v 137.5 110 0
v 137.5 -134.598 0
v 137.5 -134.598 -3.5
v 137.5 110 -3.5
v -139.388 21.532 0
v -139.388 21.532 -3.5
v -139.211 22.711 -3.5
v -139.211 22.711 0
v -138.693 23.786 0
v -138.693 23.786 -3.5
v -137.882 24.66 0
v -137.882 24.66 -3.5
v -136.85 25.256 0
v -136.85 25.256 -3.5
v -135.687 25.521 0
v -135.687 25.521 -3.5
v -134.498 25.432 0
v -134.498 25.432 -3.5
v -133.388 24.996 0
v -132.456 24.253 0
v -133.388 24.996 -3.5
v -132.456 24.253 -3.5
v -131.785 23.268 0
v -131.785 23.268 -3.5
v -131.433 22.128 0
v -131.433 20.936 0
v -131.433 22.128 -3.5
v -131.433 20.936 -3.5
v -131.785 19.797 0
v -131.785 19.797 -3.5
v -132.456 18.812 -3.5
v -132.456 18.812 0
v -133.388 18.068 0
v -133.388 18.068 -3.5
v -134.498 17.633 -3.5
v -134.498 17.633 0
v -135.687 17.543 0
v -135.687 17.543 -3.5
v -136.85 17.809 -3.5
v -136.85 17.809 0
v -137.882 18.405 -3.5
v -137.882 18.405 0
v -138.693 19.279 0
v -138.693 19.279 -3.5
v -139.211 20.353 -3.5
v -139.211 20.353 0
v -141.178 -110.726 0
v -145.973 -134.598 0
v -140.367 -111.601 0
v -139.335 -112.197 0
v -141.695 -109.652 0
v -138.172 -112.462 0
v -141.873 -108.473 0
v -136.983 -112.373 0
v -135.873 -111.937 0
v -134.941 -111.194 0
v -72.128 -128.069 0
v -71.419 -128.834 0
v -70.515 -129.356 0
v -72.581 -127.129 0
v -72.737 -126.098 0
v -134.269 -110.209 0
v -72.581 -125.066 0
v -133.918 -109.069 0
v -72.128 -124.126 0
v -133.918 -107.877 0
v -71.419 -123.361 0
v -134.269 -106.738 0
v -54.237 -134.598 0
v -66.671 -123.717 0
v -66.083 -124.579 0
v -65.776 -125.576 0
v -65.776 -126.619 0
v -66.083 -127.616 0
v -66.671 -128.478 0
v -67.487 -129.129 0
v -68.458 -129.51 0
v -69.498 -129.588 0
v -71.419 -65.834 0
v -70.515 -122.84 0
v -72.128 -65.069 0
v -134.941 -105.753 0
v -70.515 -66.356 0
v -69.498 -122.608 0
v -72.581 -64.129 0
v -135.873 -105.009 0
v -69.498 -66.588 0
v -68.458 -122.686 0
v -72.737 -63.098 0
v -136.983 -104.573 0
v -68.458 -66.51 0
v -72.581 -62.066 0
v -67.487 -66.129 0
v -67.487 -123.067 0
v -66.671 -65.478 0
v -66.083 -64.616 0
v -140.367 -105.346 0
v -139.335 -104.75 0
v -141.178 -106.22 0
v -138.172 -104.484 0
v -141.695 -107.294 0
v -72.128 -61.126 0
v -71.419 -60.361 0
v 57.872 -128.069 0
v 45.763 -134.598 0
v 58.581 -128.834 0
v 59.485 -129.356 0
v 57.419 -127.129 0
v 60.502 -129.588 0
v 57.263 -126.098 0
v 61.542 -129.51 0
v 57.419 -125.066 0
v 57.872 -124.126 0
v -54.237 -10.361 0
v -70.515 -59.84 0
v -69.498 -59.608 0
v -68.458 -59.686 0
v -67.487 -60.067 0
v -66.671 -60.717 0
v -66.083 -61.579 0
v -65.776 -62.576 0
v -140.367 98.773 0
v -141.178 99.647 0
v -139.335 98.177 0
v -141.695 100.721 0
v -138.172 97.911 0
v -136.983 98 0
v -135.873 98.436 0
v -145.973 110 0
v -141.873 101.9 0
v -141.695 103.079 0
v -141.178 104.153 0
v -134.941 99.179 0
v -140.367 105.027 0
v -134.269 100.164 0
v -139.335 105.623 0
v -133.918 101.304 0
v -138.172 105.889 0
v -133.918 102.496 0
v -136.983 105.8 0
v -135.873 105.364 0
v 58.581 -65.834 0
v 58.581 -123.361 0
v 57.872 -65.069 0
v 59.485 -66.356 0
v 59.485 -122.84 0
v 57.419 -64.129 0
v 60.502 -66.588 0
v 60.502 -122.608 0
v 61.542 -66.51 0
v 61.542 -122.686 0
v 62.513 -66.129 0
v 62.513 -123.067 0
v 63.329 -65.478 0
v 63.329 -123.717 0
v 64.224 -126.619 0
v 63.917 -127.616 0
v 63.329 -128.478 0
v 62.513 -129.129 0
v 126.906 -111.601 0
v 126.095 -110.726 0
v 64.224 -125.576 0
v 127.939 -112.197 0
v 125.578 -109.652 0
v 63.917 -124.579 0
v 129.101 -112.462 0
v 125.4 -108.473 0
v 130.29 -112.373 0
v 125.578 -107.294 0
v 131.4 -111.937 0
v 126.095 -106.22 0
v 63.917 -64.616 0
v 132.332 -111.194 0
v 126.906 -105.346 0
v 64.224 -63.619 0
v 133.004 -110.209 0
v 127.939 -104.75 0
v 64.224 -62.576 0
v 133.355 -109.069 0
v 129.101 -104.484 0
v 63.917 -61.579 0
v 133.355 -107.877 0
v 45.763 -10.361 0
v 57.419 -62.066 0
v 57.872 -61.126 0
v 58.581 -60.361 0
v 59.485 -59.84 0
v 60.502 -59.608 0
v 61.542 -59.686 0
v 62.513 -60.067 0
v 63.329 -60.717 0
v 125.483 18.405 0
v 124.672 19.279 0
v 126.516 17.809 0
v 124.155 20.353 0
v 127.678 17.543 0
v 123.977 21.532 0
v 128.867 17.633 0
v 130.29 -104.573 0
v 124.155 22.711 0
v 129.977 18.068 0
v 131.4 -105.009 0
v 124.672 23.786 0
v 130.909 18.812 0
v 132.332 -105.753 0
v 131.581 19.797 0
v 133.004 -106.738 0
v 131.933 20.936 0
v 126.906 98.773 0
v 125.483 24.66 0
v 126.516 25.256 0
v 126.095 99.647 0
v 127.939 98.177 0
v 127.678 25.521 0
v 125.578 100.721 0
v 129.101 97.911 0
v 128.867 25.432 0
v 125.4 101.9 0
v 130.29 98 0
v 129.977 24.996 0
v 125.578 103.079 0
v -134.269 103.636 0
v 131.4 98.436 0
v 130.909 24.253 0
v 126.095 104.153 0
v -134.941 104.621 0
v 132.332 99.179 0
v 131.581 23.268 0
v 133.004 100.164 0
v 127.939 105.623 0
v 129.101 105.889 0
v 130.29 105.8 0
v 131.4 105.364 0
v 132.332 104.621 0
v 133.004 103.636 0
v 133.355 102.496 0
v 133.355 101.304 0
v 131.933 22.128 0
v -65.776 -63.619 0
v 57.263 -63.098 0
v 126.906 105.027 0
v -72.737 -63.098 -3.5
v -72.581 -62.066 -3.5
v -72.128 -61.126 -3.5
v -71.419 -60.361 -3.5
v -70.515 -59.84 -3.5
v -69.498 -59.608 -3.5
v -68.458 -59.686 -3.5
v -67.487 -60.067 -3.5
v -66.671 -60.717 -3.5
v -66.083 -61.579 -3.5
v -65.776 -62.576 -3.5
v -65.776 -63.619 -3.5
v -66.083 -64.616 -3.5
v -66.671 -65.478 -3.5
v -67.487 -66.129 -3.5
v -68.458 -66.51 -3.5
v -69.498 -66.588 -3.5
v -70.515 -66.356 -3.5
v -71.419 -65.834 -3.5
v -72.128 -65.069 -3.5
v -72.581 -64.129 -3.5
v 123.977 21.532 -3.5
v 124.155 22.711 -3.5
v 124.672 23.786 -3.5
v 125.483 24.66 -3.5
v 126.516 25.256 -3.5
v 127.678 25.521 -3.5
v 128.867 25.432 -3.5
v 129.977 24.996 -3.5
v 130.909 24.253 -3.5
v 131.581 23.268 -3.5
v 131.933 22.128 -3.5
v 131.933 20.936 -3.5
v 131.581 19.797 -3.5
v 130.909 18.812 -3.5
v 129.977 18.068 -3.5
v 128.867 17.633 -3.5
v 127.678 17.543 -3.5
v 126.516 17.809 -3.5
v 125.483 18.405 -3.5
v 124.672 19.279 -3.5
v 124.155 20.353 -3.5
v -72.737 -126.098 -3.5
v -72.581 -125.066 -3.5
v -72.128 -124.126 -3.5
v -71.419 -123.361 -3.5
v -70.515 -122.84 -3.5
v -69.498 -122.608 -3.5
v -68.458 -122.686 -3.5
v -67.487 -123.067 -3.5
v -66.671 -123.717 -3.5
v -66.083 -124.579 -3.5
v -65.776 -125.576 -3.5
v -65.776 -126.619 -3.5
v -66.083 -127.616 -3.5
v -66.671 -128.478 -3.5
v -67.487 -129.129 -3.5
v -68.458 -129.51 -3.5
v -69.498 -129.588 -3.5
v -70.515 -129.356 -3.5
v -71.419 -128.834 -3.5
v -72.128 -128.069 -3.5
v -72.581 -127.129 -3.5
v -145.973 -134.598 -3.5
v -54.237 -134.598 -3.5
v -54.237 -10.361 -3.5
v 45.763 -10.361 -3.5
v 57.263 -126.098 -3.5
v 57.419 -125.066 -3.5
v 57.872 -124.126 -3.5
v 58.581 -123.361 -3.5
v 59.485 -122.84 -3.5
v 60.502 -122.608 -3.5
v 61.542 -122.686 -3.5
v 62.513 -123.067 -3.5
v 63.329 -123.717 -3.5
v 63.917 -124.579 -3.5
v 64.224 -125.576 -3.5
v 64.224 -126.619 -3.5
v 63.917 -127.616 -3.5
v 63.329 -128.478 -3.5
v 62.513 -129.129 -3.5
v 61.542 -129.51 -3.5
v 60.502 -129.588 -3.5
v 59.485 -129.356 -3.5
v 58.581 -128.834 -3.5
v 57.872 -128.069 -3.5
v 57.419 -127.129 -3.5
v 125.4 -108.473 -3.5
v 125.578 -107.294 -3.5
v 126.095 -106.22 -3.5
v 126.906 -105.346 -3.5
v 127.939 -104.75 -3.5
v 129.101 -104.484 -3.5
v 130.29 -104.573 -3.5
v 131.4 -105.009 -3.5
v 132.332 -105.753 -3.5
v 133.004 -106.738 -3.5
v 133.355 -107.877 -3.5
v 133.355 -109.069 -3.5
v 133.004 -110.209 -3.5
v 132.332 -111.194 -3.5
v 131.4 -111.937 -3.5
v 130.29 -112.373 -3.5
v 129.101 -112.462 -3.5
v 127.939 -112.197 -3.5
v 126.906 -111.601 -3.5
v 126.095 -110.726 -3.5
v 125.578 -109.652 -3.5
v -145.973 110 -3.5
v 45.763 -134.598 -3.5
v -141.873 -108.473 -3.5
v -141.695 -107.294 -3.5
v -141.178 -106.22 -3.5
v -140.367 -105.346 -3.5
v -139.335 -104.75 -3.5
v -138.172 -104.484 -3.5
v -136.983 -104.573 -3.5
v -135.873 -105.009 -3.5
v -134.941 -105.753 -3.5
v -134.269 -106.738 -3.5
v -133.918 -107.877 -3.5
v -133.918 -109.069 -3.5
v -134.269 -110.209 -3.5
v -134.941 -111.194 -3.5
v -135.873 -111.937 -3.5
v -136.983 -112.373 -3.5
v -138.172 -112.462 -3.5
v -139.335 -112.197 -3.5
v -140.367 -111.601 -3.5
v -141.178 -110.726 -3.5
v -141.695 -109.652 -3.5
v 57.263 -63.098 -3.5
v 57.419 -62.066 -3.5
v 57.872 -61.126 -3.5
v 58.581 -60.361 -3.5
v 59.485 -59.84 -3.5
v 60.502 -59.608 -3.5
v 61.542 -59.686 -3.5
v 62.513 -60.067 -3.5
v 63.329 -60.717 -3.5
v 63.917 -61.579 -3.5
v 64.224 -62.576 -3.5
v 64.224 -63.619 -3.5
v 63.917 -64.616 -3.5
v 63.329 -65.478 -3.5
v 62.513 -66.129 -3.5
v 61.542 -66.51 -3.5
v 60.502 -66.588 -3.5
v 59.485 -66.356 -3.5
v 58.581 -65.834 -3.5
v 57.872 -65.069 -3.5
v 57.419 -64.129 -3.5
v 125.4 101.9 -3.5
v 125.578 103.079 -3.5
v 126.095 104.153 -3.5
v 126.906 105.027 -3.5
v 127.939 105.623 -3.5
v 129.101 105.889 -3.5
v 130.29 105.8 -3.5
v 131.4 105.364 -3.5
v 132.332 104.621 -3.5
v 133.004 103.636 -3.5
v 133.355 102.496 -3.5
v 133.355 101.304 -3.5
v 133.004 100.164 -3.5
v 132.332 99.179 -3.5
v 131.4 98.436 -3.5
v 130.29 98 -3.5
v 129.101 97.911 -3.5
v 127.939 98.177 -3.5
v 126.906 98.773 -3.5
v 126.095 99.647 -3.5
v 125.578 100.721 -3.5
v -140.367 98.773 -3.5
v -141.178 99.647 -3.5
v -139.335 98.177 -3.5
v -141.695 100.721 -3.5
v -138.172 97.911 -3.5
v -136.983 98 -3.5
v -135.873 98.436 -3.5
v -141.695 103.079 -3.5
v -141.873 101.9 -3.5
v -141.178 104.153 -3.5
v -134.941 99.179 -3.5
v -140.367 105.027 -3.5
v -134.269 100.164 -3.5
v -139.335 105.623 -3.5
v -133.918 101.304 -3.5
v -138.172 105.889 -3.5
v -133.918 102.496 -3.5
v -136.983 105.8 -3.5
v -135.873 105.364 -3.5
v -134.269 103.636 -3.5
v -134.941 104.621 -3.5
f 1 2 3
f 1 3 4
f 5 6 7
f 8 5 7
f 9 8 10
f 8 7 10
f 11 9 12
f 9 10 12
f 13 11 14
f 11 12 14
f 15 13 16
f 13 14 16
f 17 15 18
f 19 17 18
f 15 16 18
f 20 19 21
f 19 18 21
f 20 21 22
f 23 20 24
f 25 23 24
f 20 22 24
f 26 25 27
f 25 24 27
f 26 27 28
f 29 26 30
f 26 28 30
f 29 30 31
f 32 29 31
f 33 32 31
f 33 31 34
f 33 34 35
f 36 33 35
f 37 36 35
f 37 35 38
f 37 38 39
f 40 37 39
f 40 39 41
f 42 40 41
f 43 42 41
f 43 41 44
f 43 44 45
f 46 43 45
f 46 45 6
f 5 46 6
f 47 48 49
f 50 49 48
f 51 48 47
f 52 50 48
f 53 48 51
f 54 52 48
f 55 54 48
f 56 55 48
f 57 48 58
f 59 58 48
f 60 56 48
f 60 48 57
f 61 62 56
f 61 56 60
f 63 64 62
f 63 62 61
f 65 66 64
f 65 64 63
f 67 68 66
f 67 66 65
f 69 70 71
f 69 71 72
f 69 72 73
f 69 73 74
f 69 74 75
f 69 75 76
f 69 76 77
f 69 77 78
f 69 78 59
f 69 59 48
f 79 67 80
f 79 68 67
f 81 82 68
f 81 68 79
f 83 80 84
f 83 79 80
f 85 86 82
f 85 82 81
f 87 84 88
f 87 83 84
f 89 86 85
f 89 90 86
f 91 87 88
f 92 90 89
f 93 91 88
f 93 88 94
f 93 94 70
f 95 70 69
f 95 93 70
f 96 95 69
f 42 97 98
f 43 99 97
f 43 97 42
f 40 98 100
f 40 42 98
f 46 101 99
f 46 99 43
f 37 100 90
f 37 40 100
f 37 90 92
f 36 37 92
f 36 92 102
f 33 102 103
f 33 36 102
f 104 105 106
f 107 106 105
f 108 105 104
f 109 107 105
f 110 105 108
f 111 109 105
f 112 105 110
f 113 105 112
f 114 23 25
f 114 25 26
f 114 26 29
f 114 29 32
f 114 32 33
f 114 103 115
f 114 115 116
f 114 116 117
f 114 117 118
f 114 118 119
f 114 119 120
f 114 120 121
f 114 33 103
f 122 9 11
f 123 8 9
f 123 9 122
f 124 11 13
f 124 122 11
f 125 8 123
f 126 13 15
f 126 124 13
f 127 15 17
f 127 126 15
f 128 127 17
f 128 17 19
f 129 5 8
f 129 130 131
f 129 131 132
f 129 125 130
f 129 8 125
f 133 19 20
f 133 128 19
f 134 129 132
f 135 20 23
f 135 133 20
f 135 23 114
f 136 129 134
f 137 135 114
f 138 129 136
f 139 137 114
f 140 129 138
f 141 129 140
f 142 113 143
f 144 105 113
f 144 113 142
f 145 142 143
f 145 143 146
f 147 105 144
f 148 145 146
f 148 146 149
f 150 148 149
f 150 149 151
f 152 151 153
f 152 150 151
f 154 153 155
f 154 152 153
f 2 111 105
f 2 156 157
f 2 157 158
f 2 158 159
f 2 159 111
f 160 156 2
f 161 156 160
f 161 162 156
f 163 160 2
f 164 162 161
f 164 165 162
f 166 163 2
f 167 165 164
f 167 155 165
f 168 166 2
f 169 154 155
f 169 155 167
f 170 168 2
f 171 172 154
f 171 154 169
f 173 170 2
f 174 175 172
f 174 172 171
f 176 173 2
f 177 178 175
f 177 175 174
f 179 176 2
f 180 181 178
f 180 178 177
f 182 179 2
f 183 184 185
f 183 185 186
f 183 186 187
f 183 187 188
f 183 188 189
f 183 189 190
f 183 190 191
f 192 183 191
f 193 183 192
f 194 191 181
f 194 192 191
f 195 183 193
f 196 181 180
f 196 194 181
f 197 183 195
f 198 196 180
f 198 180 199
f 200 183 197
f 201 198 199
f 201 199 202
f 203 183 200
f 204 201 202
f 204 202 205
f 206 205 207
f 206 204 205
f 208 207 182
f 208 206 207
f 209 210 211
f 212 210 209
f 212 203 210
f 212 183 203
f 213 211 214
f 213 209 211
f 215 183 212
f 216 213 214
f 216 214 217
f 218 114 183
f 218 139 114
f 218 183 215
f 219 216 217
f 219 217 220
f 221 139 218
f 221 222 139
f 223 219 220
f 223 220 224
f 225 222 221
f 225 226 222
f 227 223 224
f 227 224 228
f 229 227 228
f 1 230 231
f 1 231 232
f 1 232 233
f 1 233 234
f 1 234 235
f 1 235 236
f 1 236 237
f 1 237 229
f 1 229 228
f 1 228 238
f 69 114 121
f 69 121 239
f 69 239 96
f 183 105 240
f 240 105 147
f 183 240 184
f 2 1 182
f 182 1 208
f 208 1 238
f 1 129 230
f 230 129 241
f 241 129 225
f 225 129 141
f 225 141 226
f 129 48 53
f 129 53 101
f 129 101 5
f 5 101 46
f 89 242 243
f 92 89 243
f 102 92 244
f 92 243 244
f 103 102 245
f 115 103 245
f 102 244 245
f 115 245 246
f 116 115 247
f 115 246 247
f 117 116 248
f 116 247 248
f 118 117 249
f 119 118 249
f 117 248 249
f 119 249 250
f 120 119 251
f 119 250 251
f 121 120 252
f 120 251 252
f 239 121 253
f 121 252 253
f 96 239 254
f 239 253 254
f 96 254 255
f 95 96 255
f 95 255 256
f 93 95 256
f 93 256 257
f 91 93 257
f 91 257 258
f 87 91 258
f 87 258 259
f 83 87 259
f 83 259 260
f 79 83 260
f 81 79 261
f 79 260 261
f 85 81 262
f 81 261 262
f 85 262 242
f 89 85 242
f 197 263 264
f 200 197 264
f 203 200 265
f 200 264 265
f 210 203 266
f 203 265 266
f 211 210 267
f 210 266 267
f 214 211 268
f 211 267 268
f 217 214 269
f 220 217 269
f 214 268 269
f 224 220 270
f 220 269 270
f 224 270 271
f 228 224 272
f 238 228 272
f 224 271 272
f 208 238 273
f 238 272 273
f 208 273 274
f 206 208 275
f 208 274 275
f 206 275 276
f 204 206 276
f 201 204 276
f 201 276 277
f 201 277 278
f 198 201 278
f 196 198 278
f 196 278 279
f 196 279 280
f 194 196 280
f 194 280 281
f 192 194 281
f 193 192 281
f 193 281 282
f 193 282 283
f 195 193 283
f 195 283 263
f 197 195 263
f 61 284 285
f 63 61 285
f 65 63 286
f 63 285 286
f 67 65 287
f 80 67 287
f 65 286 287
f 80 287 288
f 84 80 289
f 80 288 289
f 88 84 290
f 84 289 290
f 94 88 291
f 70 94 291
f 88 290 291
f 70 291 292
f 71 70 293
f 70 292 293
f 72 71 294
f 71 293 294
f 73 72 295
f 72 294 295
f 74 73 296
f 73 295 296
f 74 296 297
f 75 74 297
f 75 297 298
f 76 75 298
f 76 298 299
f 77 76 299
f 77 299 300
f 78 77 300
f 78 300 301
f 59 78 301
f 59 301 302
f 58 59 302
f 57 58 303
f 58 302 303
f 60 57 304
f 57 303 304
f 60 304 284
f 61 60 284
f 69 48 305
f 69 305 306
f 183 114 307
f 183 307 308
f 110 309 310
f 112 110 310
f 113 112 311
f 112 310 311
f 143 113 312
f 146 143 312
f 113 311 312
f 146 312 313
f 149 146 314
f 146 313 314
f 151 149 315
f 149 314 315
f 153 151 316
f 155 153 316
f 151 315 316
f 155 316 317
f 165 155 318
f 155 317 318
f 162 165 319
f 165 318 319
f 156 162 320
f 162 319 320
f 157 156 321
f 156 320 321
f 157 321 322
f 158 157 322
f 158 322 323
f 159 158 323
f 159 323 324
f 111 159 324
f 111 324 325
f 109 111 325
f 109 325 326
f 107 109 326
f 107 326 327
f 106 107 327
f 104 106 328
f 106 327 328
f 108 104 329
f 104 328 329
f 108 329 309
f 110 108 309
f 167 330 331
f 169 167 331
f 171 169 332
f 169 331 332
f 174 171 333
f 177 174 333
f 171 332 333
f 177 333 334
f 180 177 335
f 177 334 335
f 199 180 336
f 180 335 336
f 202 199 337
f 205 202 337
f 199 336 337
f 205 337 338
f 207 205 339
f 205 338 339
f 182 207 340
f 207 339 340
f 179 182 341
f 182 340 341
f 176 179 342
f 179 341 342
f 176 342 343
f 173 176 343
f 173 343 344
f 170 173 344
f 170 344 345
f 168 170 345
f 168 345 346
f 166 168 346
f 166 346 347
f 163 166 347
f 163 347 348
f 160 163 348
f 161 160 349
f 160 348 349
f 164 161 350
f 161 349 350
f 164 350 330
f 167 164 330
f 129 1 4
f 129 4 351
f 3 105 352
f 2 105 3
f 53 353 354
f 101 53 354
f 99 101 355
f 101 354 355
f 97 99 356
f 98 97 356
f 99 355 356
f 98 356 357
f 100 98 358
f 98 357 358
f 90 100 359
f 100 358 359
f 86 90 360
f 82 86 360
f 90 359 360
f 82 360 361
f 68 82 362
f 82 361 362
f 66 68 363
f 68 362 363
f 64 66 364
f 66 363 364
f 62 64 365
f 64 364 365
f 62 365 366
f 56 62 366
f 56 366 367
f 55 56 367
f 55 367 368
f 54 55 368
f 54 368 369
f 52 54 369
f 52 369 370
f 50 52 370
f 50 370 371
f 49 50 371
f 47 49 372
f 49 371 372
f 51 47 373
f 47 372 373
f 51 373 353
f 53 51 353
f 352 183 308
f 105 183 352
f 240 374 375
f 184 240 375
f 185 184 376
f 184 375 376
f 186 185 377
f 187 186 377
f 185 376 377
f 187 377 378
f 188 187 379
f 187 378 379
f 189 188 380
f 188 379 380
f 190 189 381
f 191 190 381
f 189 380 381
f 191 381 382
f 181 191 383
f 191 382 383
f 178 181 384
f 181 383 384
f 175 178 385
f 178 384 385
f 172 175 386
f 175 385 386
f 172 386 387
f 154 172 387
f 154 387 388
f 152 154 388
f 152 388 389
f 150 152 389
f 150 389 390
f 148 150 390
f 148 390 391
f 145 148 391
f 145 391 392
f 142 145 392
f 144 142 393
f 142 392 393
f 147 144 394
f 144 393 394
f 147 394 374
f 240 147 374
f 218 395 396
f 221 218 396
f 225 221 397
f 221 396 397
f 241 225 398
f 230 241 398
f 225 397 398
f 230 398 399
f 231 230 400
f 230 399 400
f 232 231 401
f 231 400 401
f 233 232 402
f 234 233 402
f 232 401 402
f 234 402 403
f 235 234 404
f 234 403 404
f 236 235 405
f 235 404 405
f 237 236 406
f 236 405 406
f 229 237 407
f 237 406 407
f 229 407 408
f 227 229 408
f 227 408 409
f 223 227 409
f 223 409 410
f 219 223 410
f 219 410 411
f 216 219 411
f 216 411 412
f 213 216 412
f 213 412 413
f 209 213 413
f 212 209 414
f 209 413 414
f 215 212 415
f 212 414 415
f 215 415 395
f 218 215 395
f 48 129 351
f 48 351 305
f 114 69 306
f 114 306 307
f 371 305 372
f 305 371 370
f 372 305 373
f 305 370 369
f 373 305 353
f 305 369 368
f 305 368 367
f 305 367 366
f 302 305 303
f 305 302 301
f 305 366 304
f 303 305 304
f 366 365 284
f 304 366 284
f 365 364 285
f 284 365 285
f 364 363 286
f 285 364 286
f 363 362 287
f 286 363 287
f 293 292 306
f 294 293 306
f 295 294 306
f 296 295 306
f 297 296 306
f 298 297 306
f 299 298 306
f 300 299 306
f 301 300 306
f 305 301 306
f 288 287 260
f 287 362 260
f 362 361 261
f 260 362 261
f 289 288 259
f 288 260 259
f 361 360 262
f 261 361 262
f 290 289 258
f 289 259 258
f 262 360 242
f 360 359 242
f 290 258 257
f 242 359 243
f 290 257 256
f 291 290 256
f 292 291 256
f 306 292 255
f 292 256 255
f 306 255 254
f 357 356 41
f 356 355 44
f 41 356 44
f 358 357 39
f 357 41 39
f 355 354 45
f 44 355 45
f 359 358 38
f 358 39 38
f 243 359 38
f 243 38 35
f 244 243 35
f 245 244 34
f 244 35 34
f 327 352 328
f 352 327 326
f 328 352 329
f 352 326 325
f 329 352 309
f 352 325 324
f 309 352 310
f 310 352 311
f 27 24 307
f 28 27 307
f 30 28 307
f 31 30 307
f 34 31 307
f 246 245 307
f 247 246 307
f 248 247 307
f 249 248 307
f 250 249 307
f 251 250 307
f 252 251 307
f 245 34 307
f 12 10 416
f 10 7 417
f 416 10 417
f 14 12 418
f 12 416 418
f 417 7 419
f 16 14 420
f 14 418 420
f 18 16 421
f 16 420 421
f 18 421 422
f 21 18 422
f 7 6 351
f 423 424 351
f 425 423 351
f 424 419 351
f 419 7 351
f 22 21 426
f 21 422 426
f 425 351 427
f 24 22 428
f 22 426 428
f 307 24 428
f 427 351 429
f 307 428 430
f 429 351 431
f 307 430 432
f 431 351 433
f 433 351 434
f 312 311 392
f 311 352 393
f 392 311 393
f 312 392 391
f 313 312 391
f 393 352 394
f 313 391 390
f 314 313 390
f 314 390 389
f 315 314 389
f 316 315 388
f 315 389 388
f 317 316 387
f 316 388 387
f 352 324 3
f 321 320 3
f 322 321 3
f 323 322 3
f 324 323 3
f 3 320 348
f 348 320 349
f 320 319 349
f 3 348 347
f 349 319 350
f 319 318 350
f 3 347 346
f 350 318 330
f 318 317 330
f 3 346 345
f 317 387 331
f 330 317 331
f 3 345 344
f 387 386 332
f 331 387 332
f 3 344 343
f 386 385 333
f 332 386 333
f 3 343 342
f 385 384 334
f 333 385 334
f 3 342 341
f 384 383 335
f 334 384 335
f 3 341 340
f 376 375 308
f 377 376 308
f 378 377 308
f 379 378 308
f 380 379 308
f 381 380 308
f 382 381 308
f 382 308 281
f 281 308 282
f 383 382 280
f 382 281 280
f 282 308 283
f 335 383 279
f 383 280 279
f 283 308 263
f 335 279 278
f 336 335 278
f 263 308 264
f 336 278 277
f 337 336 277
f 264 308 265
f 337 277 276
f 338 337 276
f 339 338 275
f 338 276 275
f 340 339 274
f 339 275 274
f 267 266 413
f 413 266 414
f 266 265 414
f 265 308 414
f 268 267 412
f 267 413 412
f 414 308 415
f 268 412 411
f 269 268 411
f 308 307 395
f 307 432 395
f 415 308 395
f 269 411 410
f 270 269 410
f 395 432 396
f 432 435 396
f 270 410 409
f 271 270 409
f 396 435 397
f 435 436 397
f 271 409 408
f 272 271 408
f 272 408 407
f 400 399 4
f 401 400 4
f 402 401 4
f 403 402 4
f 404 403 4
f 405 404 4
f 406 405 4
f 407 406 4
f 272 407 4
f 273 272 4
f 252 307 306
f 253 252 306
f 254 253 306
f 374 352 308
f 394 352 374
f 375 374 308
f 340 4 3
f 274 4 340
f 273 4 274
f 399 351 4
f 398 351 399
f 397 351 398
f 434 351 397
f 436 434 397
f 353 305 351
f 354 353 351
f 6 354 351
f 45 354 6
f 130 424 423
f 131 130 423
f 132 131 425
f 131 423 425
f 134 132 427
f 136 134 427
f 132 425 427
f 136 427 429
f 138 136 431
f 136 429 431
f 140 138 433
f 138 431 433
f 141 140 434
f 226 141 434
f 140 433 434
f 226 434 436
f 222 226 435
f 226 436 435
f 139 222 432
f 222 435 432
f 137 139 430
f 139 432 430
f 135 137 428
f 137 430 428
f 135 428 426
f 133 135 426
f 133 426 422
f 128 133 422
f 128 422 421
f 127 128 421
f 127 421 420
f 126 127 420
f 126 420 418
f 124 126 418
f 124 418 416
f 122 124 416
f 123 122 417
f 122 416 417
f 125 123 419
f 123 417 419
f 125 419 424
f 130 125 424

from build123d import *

# Parameters (mm, degrees)
BASE_FLANGE1_DEPTH    = 3.5
SKETCH2_R             = 3.5
CUT_EXTRUDE1_DEPTH    = 3.5
SKETCH3_R             = 4
CUT_EXTRUDE2_DEPTH    = 3.5
F_8_0MM_DOWEL_HOLE1_D = 8
F_8_0MM_DOWEL_HOLE2_D = 8


# Sheet-metal steps are written as plain solids
with BuildPart() as part:
    # Sketch1 → Base-Flange1 (new body)
    with BuildSketch(Plane.XY):
        Polygon((-54.2366, -134.59778982), (-54.2366, -10.36118982), (45.7634, -10.36118982), (45.7634, -134.59778982), (137.5, -134.59778982), (137.5, 110), (-145.9732, 110), (-145.9732, -134.59778982), align=None)
    extrude(amount=-BASE_FLANGE1_DEPTH)

    # Sketch2 → Cut-Extrude1 (cut)
    with BuildSketch(Plane(origin=(0, 0, -3.5), x_dir=(-1, 0, 0), z_dir=(0, 0, -1))):
        with Locations((-60.7634, -126.09778982)):
            Circle(SKETCH2_R)
        with Locations((69.2366, -126.09778982)):
            Circle(SKETCH2_R)
        with Locations((-60.7634, -63.09778982)):
            Circle(SKETCH2_R)
        with Locations((69.2366, -63.09778982)):
            Circle(SKETCH2_R)
    extrude(amount=-CUT_EXTRUDE1_DEPTH, mode=Mode.SUBTRACT)

    # Sketch3 → Cut-Extrude2 (cut)
    with BuildSketch(Plane(origin=(0, 0, -3.5), x_dir=(-1, 0, 0), z_dir=(0, 0, -1))):
        with Locations((137.8732, 101.9)):
            Circle(SKETCH3_R)
        with Locations((-129.4, 101.9)):
            Circle(SKETCH3_R)
        with Locations((-129.4, -108.47319982)):
            Circle(SKETCH3_R)
        with Locations((137.8732, -108.47319982)):
            Circle(SKETCH3_R)
    extrude(amount=-CUT_EXTRUDE2_DEPTH, mode=Mode.SUBTRACT)

    # Ø8.0mm Dowel Hole1 (through all)
    with Locations(Plane(origin=(-128.31605397, 74.62471448, 0), x_dir=(1, 0, 0), z_dir=(0, 0, 1))):
        with Locations((256.29328213, -53.092411223)):
            Hole(F_8_0MM_DOWEL_HOLE1_D / 2)

    # Ø8.0mm Dowel Hole2 (through all)
    with Locations(Plane(origin=(-128.31605397, 74.62471448, 0), x_dir=(1, 0, 0), z_dir=(0, 0, 1))):
        with Locations((-7.072415731, -53.092411223)):
            Hole(F_8_0MM_DOWEL_HOLE2_D / 2)


solid = part.part
